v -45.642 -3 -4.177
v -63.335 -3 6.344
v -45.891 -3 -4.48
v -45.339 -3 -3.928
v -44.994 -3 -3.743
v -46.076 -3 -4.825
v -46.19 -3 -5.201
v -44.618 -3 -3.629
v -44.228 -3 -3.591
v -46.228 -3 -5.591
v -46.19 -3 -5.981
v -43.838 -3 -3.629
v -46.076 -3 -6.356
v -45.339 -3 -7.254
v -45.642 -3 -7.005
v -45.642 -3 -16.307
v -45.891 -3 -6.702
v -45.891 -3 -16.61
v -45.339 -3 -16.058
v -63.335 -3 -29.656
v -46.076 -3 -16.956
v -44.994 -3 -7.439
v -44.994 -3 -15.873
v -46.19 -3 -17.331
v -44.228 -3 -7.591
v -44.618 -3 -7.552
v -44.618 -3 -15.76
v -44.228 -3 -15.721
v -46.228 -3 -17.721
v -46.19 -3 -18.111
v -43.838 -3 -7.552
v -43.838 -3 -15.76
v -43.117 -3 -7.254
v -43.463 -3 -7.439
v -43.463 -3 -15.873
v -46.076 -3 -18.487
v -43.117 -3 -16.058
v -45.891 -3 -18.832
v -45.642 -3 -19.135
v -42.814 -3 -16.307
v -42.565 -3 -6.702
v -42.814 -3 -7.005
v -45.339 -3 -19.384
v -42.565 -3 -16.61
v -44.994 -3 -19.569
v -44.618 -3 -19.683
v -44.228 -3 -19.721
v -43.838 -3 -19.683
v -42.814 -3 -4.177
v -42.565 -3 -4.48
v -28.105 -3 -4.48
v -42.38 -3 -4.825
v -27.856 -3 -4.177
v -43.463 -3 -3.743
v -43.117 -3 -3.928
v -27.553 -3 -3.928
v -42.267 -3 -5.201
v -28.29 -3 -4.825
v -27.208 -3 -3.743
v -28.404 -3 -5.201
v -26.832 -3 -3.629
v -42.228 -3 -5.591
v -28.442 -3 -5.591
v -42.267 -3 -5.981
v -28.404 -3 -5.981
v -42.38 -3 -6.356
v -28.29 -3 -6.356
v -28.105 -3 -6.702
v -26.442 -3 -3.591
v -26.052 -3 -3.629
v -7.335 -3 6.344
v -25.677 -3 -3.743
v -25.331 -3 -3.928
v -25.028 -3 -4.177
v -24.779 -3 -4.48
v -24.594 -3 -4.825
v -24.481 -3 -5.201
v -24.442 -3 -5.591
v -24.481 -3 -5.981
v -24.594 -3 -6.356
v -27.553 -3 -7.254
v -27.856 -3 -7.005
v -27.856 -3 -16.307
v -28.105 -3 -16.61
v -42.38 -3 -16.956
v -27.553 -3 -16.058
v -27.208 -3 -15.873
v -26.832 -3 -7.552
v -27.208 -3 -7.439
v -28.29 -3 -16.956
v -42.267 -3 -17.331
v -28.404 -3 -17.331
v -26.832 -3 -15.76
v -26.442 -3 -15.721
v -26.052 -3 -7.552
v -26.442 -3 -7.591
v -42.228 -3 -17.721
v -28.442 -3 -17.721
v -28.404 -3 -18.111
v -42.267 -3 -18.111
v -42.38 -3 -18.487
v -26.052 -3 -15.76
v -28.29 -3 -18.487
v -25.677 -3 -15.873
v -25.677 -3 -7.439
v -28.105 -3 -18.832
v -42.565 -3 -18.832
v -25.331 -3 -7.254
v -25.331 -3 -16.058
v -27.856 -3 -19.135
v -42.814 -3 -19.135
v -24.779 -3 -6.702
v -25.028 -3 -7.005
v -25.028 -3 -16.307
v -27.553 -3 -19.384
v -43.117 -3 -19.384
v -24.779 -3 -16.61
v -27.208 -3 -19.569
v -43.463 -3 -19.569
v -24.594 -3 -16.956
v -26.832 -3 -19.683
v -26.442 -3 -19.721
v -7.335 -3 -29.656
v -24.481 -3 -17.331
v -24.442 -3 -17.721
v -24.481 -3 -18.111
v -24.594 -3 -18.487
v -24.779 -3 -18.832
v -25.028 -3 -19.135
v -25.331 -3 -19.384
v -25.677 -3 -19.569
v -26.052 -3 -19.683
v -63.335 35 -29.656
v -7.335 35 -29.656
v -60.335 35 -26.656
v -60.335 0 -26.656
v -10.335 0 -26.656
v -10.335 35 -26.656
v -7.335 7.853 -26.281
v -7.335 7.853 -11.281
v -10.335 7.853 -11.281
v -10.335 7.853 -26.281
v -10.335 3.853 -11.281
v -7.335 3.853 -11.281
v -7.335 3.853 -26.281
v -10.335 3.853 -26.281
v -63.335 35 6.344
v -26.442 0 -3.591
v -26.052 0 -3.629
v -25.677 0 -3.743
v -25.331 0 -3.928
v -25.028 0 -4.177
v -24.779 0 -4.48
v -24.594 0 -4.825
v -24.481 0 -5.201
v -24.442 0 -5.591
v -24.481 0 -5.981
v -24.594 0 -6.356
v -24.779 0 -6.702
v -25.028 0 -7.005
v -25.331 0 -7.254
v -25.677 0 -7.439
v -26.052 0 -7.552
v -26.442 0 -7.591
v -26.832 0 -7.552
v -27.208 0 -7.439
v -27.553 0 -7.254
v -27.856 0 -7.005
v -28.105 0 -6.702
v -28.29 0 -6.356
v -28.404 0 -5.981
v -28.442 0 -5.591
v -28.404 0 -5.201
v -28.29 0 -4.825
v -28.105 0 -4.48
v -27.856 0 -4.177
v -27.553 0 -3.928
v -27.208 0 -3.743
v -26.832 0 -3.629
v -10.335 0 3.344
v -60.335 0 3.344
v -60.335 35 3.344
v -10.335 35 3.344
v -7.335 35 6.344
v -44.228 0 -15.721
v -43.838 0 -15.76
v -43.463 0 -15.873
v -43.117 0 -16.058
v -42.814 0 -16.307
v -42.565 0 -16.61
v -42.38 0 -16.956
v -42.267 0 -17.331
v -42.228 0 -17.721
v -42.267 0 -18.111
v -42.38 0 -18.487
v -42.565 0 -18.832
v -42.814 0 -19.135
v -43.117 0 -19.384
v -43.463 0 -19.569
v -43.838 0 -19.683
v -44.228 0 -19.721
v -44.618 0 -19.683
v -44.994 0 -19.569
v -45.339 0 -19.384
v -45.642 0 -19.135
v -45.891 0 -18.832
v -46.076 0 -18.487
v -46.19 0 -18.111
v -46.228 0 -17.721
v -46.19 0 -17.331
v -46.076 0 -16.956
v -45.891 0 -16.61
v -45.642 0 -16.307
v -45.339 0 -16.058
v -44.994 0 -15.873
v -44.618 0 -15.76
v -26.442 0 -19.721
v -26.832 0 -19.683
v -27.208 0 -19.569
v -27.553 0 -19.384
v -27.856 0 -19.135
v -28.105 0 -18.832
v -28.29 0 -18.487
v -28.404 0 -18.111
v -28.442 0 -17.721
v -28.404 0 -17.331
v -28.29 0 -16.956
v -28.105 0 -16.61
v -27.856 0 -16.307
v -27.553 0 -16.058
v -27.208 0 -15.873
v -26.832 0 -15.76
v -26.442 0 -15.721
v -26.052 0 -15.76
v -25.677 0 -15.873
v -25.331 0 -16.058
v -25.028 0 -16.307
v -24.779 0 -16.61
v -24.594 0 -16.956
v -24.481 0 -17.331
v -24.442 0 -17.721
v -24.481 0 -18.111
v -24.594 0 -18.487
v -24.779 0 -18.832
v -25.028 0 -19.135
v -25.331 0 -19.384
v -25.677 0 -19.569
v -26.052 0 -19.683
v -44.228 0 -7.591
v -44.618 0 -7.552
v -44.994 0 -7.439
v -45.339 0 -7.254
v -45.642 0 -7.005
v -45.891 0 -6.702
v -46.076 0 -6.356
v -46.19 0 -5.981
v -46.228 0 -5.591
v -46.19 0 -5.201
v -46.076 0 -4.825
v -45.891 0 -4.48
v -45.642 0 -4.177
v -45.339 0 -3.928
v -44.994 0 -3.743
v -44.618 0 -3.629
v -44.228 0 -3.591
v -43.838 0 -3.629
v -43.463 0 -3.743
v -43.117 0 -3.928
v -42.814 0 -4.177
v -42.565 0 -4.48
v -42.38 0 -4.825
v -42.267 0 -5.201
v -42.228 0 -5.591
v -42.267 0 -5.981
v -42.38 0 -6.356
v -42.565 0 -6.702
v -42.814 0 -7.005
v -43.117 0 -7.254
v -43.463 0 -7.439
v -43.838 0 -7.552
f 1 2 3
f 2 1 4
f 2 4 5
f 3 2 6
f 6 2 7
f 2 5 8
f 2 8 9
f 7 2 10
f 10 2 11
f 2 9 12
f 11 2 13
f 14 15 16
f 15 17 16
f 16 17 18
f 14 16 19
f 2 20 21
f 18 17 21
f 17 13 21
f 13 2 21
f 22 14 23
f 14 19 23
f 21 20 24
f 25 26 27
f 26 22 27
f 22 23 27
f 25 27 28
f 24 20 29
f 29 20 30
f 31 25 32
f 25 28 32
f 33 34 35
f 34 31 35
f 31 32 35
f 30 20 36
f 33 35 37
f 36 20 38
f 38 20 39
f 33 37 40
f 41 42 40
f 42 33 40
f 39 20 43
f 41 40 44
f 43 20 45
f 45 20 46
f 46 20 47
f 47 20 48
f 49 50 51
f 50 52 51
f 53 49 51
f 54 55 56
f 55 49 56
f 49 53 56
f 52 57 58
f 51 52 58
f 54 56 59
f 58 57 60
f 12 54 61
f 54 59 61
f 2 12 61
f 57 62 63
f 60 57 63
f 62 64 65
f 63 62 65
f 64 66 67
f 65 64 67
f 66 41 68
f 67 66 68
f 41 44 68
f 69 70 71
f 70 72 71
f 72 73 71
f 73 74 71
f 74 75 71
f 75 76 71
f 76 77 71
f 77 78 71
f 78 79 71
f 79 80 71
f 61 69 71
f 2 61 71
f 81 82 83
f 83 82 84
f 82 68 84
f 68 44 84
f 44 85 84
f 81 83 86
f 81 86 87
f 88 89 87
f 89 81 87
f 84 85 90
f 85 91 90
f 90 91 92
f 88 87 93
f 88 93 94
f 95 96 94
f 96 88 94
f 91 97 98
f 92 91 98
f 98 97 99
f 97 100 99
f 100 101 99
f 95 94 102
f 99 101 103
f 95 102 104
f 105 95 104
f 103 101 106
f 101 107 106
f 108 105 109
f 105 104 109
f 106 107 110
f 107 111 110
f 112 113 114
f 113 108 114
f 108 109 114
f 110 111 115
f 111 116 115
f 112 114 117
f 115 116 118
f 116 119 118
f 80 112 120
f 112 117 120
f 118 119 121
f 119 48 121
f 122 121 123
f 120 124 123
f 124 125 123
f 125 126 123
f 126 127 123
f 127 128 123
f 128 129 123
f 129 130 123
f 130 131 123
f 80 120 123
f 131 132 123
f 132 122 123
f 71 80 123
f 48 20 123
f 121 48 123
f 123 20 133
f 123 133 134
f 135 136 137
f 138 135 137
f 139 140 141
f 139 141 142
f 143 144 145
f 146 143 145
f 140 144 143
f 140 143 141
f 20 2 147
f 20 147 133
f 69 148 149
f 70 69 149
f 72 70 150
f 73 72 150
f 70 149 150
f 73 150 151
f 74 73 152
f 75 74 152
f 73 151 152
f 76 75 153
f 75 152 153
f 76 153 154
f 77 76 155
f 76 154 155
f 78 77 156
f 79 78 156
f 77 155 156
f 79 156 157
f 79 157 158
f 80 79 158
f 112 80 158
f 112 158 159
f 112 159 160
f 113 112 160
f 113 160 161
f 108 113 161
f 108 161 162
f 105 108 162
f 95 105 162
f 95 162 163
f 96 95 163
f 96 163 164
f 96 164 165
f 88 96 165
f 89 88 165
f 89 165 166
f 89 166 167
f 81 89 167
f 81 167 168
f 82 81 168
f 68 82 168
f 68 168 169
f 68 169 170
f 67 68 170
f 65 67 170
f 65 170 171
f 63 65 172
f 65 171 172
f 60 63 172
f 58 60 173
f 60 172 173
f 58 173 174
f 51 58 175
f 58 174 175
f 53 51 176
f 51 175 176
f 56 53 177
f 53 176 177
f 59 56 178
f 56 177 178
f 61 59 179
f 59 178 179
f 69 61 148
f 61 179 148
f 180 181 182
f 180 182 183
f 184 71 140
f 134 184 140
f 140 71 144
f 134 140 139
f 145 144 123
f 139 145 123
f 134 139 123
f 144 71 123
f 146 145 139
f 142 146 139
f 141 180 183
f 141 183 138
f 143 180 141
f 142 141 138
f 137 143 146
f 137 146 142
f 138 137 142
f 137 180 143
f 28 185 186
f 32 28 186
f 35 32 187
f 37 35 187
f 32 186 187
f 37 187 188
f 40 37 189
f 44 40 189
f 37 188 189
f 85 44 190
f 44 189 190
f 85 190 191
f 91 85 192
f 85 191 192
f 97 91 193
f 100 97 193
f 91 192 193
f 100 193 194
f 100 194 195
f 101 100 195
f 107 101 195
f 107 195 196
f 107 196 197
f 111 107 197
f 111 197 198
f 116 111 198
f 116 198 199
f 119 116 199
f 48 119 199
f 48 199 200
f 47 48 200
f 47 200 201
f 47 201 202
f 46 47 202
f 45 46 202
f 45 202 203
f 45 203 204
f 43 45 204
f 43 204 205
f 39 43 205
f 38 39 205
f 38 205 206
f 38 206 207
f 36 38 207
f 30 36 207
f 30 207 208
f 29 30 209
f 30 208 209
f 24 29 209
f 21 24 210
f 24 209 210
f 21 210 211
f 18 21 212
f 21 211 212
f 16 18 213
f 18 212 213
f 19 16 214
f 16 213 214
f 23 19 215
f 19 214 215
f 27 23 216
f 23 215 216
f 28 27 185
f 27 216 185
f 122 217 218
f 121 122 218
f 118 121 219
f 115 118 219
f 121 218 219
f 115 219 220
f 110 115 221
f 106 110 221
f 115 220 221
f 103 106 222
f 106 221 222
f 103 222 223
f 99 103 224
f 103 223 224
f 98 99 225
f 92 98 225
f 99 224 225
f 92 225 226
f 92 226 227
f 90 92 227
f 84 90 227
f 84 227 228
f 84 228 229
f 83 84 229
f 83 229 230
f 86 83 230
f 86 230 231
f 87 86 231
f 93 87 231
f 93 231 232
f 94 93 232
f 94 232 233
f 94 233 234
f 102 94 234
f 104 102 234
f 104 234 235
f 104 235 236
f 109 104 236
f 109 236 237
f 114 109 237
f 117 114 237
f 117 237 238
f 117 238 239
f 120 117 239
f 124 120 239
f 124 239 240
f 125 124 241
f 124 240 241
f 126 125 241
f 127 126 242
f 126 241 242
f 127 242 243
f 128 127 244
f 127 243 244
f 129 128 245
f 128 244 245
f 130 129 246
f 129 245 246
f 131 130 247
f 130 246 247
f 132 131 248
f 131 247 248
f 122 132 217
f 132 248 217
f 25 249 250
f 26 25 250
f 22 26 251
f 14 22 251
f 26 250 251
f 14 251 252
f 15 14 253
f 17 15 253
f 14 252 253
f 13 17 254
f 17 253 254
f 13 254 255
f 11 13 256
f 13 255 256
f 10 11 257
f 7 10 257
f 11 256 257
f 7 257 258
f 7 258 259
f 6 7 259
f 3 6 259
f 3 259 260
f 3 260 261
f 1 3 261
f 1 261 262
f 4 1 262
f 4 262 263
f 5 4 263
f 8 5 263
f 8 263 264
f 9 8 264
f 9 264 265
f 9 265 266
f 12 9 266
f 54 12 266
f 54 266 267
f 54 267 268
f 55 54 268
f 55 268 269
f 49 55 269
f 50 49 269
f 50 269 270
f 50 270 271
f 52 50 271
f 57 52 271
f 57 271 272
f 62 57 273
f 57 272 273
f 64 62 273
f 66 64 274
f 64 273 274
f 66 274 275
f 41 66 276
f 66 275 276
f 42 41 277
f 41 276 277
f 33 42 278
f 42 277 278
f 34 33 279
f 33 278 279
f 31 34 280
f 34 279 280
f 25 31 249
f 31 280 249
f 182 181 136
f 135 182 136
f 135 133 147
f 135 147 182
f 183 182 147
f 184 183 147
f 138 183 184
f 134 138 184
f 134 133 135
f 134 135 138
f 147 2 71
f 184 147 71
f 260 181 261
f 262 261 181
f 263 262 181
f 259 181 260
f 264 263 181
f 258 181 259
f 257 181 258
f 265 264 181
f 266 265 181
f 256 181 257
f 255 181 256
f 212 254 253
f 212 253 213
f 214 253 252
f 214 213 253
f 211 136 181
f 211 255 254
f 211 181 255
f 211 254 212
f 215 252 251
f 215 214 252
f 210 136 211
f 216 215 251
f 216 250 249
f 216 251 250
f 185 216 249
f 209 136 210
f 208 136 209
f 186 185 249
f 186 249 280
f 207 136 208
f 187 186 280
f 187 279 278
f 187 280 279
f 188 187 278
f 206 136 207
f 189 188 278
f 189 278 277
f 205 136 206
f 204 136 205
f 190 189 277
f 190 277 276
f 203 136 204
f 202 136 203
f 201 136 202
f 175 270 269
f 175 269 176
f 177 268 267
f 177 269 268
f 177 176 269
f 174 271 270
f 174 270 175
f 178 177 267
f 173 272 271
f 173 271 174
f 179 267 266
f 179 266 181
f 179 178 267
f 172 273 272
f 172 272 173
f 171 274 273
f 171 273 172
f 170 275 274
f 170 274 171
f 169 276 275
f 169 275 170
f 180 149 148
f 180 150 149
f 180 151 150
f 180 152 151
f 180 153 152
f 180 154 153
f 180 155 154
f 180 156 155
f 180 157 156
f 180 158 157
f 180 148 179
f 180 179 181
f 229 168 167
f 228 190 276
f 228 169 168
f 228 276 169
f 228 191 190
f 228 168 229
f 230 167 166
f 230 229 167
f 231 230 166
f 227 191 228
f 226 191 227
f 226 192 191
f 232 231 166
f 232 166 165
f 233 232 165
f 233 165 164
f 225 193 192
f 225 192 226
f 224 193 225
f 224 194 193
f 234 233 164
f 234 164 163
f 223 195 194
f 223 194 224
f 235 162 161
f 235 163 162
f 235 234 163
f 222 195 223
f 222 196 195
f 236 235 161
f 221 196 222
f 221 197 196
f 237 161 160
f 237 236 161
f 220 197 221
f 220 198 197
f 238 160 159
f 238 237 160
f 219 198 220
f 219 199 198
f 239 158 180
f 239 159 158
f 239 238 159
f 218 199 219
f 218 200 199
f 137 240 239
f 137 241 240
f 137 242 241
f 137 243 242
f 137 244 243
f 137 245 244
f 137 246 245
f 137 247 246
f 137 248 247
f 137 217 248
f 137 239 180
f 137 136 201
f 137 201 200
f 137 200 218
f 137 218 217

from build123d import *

# Parameters (mm, degrees)
ESBO_O1_W                = 50
ESBO_O1_H                = 30
RESSALTO_EXTRUS_O1_DEPTH = 35
CASCA1_T                 = 3
ESBO_O3_W                = 15
ESBO_O3_H                = 4
CORTE_EXTRUS_O2_DEPTH    = 35
ESBO_O4_R                = 2
CORTE_EXTRUS_O3_DEPTH    = 79.203795706


with BuildPart() as part:
    # Esboço1 → Ressalto-extrusão1 (new body)
    with BuildSketch(Plane(origin=(0, 0, 0), x_dir=(1, 0, 0), z_dir=(0, 1, 0))):
        with Locations((-35.335240137, 11.656045246)):
            Rectangle(ESBO_O1_W, ESBO_O1_H)
    extrude(amount=RESSALTO_EXTRUS_O1_DEPTH)

    # Casca1
    casca1_openings = [part.faces().sort_by_distance(p)[0] for p in [
        (-35.335240137, 35, -11.656045246),
    ]]
    offset(amount=CASCA1_T, openings=casca1_openings, kind=Kind.INTERSECTION)

    # Esboço3 → Corte-extrusão2 (cut)
    with BuildSketch(Plane(origin=(-7.335240137, 0, 0), x_dir=(0, 0, -1), z_dir=(1, 0, 0))):
        with Locations((18.781461493, 5.852803371)):
            Rectangle(ESBO_O3_W, ESBO_O3_H)
    extrude(amount=-CORTE_EXTRUS_O2_DEPTH, mode=Mode.SUBTRACT)

    # Esboço4 → Corte-extrusão3 (cut, through all)
    with BuildSketch(Plane(origin=(0, 0, 0), x_dir=(1, 0, 0), z_dir=(0, 1, 0))):
        with Locations(Location((-44.228238168, 17.721247166, 0), (0, 0, 270))):
            Circle(ESBO_O4_R)
        with Locations(Location((-44.228238168, 5.590843326, 0), (0, 0, 90))):
            Circle(ESBO_O4_R)
        with Locations(Location((-26.442242107, 5.590843326, 0), (0, 0, 270))):
            Circle(ESBO_O4_R)
        with Locations(Location((-26.442242107, 17.721247166, 0), (0, 0, 90))):
            Circle(ESBO_O4_R)
    extrude(amount=-CORTE_EXTRUS_O3_DEPTH, mode=Mode.SUBTRACT)


solid = part.part
